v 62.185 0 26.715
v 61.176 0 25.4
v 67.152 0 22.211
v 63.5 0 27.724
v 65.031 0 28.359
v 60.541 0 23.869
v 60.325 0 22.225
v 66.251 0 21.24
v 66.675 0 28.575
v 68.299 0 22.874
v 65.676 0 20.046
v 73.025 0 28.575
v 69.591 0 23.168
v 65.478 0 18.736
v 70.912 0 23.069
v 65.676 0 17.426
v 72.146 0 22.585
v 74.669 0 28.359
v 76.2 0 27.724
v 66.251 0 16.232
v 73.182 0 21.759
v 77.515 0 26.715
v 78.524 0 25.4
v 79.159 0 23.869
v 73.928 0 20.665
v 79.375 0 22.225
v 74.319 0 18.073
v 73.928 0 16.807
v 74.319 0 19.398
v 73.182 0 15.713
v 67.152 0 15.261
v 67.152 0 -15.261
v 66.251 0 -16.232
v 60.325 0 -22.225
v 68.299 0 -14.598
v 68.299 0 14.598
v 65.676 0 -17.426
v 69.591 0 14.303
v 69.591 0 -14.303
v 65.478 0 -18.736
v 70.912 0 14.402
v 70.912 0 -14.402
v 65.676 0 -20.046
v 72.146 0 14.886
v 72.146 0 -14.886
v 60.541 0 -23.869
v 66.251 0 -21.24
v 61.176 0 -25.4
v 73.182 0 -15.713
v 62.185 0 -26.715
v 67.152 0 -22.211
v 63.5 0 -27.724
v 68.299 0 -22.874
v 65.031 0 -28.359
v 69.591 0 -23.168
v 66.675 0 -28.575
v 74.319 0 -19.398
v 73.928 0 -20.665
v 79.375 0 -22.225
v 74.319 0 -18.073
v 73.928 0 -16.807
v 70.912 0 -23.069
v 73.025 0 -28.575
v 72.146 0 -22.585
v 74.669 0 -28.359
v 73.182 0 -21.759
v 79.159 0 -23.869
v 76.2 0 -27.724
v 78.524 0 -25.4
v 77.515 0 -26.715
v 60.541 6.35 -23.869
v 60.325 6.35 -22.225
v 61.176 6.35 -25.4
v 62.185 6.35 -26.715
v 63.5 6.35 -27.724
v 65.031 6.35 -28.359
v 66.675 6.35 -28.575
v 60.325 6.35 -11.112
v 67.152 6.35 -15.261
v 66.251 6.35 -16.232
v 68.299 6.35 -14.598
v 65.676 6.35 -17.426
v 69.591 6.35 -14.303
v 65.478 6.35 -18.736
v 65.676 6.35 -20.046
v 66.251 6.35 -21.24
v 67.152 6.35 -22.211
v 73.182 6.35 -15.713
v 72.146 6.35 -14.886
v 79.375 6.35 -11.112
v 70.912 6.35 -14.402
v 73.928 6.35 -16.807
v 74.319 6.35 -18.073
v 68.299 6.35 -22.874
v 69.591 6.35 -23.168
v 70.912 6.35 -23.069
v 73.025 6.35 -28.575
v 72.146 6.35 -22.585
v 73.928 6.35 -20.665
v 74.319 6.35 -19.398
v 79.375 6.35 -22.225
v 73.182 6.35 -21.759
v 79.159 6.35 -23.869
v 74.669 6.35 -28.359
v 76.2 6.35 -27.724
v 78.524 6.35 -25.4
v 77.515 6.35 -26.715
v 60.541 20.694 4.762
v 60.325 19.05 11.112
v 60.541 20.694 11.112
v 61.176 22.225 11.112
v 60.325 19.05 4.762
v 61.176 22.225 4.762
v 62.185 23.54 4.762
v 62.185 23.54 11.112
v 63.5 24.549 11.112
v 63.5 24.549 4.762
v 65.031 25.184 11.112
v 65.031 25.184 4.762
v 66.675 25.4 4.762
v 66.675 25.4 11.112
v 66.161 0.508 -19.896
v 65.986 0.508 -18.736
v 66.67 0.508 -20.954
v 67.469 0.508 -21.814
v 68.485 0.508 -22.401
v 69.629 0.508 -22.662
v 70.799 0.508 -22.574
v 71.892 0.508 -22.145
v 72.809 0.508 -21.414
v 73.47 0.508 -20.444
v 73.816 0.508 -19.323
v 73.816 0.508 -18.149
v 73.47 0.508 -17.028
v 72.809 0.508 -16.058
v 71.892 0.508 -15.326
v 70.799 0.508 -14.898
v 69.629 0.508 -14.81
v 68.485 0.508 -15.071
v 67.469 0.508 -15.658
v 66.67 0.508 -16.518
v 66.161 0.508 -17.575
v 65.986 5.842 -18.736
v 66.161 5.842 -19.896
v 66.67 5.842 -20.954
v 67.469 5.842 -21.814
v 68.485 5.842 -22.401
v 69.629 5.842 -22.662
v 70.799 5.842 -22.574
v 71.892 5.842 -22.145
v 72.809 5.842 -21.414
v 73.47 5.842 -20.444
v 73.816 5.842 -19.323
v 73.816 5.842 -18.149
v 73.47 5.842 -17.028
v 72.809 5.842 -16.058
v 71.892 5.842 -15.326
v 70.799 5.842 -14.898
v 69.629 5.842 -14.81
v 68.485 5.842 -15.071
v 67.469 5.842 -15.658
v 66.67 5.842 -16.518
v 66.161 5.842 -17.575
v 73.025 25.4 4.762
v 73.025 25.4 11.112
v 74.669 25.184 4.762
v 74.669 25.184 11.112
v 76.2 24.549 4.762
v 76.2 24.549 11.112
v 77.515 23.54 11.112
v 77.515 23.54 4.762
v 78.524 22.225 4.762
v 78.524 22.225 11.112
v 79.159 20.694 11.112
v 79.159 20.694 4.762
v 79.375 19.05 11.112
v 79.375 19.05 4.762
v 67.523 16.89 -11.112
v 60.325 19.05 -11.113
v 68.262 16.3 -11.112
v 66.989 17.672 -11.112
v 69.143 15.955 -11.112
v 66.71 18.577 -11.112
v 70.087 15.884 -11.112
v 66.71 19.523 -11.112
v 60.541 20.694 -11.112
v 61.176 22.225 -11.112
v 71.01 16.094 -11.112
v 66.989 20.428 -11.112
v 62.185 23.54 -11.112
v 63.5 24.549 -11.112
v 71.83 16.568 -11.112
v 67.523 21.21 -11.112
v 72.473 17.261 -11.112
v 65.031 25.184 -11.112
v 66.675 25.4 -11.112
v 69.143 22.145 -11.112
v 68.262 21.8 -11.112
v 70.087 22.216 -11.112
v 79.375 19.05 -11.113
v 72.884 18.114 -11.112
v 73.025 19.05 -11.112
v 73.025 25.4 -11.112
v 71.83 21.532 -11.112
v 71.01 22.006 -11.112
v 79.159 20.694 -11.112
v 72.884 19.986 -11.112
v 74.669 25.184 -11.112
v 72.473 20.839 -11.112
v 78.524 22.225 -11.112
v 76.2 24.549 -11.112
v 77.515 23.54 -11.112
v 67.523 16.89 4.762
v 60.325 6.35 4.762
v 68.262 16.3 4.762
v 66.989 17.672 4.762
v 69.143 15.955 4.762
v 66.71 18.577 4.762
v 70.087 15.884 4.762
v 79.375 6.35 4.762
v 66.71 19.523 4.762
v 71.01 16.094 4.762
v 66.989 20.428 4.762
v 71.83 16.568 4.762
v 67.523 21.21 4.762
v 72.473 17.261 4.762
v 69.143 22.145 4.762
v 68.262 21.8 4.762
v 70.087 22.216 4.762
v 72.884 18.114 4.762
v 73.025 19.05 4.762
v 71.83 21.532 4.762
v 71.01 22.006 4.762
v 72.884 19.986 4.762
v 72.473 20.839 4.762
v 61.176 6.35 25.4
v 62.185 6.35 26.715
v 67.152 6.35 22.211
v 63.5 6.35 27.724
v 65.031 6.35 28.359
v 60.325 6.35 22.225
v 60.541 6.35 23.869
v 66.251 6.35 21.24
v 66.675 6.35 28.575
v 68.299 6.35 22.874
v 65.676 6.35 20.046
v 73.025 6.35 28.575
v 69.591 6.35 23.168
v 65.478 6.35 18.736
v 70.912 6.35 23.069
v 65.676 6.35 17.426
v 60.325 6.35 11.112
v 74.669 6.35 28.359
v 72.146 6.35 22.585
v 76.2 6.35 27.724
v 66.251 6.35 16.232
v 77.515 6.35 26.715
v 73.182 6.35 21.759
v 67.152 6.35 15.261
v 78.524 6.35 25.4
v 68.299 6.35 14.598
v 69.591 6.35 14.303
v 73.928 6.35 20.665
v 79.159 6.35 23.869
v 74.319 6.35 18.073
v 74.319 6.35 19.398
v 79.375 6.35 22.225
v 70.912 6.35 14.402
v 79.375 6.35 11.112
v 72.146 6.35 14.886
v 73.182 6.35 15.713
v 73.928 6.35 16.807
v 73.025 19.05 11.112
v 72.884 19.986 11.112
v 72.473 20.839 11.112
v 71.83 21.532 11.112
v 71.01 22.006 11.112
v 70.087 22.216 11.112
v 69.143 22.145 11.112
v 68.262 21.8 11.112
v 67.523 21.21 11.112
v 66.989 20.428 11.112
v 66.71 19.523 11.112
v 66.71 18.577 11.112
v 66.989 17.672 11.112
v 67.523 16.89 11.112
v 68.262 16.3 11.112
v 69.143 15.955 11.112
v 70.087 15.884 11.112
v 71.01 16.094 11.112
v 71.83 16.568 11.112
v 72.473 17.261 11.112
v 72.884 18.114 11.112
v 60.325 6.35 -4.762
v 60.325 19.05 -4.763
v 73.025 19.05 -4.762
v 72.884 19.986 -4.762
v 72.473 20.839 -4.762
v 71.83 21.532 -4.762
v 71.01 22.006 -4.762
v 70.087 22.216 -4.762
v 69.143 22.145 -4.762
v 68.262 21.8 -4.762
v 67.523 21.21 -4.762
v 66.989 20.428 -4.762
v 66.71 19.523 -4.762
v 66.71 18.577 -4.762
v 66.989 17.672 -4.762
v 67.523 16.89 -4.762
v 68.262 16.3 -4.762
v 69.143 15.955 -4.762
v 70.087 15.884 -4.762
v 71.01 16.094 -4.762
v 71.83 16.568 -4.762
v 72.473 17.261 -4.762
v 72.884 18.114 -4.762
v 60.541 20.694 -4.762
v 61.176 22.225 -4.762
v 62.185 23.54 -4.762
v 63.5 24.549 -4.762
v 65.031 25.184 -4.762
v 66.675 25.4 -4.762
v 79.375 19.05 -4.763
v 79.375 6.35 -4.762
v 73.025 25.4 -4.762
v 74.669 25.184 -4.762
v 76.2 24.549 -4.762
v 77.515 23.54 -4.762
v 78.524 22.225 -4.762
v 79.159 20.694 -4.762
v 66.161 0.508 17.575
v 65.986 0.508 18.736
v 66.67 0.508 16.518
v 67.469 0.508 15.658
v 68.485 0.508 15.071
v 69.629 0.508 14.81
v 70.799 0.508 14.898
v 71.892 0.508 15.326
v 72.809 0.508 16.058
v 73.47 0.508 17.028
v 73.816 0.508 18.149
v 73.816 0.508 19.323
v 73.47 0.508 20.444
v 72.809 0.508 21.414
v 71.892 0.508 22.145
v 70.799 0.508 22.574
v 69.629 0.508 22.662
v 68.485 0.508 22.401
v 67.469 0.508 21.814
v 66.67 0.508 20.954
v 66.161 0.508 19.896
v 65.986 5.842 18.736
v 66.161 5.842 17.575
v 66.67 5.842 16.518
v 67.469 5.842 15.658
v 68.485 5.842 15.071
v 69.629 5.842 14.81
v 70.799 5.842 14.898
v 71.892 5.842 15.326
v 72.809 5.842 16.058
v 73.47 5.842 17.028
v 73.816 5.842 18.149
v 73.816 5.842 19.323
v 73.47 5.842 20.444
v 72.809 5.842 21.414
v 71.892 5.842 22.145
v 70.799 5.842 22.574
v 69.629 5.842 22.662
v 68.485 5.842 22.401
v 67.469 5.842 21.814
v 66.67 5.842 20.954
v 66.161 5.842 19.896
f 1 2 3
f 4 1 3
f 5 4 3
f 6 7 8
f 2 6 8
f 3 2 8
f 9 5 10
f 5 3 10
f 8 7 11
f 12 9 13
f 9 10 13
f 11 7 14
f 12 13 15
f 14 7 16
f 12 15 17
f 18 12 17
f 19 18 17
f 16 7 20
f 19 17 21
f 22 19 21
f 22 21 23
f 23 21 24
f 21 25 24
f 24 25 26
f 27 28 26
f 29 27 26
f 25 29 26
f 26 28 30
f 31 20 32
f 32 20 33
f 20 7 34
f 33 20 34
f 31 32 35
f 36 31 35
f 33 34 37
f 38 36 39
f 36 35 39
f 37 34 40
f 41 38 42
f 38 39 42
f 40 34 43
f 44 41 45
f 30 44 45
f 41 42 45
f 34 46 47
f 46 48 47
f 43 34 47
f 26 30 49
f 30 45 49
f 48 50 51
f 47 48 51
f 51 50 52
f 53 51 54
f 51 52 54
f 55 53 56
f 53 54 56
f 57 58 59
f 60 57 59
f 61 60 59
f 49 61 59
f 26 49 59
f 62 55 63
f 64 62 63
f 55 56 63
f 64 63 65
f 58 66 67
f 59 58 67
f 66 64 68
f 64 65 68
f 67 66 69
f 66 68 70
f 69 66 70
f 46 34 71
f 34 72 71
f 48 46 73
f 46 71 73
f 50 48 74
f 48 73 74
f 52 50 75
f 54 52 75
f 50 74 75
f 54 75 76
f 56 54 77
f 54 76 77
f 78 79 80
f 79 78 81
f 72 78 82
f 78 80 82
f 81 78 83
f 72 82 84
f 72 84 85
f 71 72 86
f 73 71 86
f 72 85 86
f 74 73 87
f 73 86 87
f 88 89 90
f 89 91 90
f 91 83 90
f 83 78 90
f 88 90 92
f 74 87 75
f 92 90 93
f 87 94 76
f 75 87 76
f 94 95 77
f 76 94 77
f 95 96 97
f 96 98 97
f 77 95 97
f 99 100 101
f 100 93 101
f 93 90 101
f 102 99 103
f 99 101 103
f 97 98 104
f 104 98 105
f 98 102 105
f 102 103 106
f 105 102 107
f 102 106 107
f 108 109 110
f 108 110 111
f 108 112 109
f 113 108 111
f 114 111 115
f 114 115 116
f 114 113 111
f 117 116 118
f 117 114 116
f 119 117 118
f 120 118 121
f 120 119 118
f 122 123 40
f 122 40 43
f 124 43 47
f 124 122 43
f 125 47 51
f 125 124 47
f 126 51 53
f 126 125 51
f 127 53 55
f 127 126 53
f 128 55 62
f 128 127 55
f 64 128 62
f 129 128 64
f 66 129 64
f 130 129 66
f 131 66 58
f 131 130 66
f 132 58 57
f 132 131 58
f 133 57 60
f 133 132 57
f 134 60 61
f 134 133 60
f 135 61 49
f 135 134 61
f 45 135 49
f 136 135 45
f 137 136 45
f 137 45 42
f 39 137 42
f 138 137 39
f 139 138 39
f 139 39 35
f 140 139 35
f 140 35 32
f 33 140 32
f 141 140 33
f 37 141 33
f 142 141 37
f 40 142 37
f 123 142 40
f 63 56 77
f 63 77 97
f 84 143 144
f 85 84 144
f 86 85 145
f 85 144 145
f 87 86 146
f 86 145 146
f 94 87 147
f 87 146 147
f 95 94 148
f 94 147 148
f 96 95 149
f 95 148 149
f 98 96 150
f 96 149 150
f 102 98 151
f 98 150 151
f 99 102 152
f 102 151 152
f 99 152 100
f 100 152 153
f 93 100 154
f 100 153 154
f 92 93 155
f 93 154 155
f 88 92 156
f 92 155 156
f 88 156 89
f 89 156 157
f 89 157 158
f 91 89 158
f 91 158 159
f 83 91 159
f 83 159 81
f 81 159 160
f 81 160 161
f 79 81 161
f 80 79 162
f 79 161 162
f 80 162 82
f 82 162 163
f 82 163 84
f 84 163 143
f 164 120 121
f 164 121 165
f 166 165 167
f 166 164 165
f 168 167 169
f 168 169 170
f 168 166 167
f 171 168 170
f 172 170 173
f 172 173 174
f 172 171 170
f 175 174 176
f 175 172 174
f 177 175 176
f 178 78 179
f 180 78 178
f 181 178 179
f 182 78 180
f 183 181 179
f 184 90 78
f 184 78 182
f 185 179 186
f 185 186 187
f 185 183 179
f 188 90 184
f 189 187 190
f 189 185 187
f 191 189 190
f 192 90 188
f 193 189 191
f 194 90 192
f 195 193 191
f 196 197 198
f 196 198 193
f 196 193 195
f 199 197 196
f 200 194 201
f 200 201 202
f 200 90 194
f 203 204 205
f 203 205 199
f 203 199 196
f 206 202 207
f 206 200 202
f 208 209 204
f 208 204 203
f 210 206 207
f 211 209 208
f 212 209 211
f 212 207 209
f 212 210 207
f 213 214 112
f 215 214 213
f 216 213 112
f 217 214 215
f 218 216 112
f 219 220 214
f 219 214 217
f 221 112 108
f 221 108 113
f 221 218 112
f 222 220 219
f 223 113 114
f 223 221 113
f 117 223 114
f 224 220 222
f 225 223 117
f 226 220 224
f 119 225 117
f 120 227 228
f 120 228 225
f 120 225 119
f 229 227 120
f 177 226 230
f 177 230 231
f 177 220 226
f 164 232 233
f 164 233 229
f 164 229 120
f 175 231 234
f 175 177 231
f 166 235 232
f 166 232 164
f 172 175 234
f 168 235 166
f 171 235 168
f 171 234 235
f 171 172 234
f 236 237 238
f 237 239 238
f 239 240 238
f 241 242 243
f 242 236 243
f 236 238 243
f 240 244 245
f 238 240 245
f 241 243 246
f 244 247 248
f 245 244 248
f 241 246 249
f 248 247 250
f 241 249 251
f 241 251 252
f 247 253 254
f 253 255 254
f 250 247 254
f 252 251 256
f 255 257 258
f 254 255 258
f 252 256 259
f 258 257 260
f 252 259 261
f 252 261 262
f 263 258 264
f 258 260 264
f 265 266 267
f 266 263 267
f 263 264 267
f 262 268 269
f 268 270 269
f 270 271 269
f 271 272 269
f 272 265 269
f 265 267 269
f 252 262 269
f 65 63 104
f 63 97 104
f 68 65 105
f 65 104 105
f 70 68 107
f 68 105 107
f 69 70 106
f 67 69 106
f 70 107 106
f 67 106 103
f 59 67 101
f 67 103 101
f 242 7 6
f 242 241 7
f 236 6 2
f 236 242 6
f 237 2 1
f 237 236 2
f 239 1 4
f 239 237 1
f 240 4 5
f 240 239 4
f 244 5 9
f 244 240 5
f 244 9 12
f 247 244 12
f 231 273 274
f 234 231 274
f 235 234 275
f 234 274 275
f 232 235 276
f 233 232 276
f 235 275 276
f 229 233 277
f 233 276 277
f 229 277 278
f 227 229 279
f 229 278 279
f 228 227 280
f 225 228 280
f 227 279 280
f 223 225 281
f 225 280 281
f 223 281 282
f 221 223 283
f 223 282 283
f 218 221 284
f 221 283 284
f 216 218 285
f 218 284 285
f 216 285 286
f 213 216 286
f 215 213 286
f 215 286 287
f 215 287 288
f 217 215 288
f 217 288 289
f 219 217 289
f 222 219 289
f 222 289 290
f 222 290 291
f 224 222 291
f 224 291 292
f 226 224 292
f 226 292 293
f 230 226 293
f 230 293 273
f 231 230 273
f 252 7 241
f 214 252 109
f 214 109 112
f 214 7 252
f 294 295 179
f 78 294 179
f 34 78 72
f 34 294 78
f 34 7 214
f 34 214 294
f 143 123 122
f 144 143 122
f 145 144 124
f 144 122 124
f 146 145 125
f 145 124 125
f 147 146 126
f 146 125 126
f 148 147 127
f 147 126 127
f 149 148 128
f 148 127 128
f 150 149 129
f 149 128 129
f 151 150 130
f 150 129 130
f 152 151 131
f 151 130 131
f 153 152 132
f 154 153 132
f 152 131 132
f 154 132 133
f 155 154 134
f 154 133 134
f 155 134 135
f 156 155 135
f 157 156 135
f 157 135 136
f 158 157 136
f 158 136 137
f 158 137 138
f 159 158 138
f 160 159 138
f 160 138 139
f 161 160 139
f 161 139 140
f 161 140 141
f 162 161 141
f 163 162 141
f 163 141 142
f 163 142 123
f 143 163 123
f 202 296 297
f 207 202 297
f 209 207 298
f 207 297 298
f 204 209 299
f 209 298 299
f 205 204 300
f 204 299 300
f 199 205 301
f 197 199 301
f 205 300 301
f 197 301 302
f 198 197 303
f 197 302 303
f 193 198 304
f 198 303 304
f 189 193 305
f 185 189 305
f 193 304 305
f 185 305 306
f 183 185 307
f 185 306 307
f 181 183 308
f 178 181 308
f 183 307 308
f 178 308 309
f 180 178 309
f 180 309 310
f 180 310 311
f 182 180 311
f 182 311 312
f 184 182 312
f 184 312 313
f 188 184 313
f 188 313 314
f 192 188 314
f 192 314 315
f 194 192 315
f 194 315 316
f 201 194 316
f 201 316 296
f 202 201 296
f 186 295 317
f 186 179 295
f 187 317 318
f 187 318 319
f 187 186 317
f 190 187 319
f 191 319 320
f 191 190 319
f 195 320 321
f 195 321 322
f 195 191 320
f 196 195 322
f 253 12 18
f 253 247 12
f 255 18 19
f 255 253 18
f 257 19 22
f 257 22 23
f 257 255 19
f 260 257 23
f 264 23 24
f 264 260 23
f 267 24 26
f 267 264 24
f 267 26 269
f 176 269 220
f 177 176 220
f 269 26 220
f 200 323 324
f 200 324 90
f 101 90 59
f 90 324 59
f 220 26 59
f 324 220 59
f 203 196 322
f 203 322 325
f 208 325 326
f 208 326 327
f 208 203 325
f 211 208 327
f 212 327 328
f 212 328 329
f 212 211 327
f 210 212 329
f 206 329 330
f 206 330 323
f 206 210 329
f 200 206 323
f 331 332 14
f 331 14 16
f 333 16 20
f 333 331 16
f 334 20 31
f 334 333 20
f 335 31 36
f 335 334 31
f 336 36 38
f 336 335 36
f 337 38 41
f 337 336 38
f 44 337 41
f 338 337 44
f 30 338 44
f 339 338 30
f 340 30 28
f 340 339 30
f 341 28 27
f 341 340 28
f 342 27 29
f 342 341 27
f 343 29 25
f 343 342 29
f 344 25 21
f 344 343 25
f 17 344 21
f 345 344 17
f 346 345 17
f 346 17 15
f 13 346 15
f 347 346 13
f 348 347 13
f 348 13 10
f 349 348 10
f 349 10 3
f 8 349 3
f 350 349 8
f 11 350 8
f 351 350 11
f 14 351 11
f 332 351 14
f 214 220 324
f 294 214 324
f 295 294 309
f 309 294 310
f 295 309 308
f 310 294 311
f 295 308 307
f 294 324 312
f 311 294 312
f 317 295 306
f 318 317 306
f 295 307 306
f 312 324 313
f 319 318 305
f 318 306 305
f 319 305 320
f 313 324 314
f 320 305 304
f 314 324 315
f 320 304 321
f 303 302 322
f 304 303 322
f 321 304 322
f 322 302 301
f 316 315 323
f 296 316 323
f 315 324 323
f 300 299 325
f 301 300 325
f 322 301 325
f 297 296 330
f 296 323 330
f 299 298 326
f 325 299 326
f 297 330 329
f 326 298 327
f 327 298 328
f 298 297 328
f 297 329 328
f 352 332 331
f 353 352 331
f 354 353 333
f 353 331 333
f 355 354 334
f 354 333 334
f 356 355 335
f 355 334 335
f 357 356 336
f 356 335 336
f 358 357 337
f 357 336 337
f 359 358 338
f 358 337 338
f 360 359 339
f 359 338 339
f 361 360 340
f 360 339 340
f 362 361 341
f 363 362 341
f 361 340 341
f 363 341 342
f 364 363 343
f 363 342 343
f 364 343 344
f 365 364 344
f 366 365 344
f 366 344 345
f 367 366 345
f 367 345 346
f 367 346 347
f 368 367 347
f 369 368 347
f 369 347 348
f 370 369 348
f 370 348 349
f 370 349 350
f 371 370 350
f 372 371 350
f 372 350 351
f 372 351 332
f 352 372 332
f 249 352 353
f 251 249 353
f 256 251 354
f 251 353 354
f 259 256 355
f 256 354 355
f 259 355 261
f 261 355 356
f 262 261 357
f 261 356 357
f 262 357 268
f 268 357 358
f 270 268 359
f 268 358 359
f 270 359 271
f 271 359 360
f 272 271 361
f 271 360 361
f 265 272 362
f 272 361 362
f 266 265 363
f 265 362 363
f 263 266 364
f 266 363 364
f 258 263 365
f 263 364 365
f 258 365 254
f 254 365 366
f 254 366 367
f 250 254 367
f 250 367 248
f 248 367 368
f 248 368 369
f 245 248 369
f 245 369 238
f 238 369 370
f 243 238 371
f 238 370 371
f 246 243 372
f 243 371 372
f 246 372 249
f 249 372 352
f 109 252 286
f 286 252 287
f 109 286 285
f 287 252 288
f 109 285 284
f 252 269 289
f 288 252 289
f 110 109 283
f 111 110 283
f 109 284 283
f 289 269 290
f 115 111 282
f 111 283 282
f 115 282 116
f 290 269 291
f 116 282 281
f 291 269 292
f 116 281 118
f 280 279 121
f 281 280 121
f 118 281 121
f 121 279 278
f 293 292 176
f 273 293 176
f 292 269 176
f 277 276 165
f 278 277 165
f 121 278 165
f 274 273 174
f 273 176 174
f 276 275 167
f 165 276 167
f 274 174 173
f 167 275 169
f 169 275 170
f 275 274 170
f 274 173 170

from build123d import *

# Parameters (mm, degrees)
SKETCH1_W           = 19.05
SKETCH1_H           = 57.15
BOSS_EXTRUDE1_DEPTH = 25.4
SKETCH2_W           = 17.4625
SKETCH2_H           = 19.05
SKETCH2_W_2         = 9.525
CUT_EXTRUDE1_DEPTH  = 20.05
SKETCH9_R           = 3.175
CUT_EXTRUDE3_DEPTH  = 40.6875
FILLET1_R           = 6.35
HOLE1_D             = 7.874
CHAMFER1_SIZE       = 0.508


with BuildPart() as part:
    # Sketch1 → Boss-Extrude1 (new body)
    with BuildSketch(Plane(origin=(0, 0, 0), x_dir=(1, 0, 0), z_dir=(0, 1, 0))):
        with Locations((69.85, 0)):
            Rectangle(SKETCH1_W, SKETCH1_H)
    extrude(amount=BOSS_EXTRUDE1_DEPTH)

    # Sketch2 → Cut-Extrude1 (cut, through all)
    with BuildSketch(Plane(origin=(79.375, 0, 0), x_dir=(0, 0, -1), z_dir=(1, 0, 0))):
        with Locations((-19.84375, 15.875)):
            Rectangle(SKETCH2_W, SKETCH2_H)
        with Locations((0, 15.875)):
            Rectangle(SKETCH2_W_2, SKETCH2_H)
        with Locations((19.84375, 15.875)):
            Rectangle(SKETCH2_W, SKETCH2_H)
    extrude(amount=-CUT_EXTRUDE1_DEPTH, mode=Mode.SUBTRACT)

    # Sketch9 → Cut-Extrude3 (cut, through all)
    with BuildSketch(Plane.XY.offset(11.1125)):
        with Locations((69.85, 19.05)):
            Circle(SKETCH9_R)
    extrude(amount=-CUT_EXTRUDE3_DEPTH, mode=Mode.SUBTRACT)

    # Fillet1
    fillet1_edges = [part.edges().sort_by_distance(p)[0] for p in [
        (79.375, 25.4, 7.9375),
        (79.375, 3.175, 28.575),
        (60.325, 3.175, 28.575),
        (79.375, 25.4, -7.9375),
        (60.325, 25.4, -7.9375),
        (60.325, 25.4, 7.9375),
        (60.325, 3.175, -28.575),
        (79.375, 3.175, -28.575),
    ]]
    fillet(fillet1_edges, radius=FILLET1_R)

    # Hole1 (through all)
    with Locations(Plane(origin=(0, 6.35, 0), x_dir=(1, 0, 0), z_dir=(0, 1, 0))):
        with Locations((69.923370565, 18.735910675), (69.923370565, -18.735910675)):
            Hole(HOLE1_D / 2)

    # Chamfer1
    chamfer1_edges = [part.edges().sort_by_distance(p)[0] for p in [
        (73.860370565, 6.35, 18.735910675),
        (73.860370565, 0, 18.735910675),
        (73.860370565, 6.35, -18.735910675),
        (73.860370565, 0, -18.735910675),
    ]]
    chamfer(chamfer1_edges, length=CHAMFER1_SIZE)


solid = part.part
